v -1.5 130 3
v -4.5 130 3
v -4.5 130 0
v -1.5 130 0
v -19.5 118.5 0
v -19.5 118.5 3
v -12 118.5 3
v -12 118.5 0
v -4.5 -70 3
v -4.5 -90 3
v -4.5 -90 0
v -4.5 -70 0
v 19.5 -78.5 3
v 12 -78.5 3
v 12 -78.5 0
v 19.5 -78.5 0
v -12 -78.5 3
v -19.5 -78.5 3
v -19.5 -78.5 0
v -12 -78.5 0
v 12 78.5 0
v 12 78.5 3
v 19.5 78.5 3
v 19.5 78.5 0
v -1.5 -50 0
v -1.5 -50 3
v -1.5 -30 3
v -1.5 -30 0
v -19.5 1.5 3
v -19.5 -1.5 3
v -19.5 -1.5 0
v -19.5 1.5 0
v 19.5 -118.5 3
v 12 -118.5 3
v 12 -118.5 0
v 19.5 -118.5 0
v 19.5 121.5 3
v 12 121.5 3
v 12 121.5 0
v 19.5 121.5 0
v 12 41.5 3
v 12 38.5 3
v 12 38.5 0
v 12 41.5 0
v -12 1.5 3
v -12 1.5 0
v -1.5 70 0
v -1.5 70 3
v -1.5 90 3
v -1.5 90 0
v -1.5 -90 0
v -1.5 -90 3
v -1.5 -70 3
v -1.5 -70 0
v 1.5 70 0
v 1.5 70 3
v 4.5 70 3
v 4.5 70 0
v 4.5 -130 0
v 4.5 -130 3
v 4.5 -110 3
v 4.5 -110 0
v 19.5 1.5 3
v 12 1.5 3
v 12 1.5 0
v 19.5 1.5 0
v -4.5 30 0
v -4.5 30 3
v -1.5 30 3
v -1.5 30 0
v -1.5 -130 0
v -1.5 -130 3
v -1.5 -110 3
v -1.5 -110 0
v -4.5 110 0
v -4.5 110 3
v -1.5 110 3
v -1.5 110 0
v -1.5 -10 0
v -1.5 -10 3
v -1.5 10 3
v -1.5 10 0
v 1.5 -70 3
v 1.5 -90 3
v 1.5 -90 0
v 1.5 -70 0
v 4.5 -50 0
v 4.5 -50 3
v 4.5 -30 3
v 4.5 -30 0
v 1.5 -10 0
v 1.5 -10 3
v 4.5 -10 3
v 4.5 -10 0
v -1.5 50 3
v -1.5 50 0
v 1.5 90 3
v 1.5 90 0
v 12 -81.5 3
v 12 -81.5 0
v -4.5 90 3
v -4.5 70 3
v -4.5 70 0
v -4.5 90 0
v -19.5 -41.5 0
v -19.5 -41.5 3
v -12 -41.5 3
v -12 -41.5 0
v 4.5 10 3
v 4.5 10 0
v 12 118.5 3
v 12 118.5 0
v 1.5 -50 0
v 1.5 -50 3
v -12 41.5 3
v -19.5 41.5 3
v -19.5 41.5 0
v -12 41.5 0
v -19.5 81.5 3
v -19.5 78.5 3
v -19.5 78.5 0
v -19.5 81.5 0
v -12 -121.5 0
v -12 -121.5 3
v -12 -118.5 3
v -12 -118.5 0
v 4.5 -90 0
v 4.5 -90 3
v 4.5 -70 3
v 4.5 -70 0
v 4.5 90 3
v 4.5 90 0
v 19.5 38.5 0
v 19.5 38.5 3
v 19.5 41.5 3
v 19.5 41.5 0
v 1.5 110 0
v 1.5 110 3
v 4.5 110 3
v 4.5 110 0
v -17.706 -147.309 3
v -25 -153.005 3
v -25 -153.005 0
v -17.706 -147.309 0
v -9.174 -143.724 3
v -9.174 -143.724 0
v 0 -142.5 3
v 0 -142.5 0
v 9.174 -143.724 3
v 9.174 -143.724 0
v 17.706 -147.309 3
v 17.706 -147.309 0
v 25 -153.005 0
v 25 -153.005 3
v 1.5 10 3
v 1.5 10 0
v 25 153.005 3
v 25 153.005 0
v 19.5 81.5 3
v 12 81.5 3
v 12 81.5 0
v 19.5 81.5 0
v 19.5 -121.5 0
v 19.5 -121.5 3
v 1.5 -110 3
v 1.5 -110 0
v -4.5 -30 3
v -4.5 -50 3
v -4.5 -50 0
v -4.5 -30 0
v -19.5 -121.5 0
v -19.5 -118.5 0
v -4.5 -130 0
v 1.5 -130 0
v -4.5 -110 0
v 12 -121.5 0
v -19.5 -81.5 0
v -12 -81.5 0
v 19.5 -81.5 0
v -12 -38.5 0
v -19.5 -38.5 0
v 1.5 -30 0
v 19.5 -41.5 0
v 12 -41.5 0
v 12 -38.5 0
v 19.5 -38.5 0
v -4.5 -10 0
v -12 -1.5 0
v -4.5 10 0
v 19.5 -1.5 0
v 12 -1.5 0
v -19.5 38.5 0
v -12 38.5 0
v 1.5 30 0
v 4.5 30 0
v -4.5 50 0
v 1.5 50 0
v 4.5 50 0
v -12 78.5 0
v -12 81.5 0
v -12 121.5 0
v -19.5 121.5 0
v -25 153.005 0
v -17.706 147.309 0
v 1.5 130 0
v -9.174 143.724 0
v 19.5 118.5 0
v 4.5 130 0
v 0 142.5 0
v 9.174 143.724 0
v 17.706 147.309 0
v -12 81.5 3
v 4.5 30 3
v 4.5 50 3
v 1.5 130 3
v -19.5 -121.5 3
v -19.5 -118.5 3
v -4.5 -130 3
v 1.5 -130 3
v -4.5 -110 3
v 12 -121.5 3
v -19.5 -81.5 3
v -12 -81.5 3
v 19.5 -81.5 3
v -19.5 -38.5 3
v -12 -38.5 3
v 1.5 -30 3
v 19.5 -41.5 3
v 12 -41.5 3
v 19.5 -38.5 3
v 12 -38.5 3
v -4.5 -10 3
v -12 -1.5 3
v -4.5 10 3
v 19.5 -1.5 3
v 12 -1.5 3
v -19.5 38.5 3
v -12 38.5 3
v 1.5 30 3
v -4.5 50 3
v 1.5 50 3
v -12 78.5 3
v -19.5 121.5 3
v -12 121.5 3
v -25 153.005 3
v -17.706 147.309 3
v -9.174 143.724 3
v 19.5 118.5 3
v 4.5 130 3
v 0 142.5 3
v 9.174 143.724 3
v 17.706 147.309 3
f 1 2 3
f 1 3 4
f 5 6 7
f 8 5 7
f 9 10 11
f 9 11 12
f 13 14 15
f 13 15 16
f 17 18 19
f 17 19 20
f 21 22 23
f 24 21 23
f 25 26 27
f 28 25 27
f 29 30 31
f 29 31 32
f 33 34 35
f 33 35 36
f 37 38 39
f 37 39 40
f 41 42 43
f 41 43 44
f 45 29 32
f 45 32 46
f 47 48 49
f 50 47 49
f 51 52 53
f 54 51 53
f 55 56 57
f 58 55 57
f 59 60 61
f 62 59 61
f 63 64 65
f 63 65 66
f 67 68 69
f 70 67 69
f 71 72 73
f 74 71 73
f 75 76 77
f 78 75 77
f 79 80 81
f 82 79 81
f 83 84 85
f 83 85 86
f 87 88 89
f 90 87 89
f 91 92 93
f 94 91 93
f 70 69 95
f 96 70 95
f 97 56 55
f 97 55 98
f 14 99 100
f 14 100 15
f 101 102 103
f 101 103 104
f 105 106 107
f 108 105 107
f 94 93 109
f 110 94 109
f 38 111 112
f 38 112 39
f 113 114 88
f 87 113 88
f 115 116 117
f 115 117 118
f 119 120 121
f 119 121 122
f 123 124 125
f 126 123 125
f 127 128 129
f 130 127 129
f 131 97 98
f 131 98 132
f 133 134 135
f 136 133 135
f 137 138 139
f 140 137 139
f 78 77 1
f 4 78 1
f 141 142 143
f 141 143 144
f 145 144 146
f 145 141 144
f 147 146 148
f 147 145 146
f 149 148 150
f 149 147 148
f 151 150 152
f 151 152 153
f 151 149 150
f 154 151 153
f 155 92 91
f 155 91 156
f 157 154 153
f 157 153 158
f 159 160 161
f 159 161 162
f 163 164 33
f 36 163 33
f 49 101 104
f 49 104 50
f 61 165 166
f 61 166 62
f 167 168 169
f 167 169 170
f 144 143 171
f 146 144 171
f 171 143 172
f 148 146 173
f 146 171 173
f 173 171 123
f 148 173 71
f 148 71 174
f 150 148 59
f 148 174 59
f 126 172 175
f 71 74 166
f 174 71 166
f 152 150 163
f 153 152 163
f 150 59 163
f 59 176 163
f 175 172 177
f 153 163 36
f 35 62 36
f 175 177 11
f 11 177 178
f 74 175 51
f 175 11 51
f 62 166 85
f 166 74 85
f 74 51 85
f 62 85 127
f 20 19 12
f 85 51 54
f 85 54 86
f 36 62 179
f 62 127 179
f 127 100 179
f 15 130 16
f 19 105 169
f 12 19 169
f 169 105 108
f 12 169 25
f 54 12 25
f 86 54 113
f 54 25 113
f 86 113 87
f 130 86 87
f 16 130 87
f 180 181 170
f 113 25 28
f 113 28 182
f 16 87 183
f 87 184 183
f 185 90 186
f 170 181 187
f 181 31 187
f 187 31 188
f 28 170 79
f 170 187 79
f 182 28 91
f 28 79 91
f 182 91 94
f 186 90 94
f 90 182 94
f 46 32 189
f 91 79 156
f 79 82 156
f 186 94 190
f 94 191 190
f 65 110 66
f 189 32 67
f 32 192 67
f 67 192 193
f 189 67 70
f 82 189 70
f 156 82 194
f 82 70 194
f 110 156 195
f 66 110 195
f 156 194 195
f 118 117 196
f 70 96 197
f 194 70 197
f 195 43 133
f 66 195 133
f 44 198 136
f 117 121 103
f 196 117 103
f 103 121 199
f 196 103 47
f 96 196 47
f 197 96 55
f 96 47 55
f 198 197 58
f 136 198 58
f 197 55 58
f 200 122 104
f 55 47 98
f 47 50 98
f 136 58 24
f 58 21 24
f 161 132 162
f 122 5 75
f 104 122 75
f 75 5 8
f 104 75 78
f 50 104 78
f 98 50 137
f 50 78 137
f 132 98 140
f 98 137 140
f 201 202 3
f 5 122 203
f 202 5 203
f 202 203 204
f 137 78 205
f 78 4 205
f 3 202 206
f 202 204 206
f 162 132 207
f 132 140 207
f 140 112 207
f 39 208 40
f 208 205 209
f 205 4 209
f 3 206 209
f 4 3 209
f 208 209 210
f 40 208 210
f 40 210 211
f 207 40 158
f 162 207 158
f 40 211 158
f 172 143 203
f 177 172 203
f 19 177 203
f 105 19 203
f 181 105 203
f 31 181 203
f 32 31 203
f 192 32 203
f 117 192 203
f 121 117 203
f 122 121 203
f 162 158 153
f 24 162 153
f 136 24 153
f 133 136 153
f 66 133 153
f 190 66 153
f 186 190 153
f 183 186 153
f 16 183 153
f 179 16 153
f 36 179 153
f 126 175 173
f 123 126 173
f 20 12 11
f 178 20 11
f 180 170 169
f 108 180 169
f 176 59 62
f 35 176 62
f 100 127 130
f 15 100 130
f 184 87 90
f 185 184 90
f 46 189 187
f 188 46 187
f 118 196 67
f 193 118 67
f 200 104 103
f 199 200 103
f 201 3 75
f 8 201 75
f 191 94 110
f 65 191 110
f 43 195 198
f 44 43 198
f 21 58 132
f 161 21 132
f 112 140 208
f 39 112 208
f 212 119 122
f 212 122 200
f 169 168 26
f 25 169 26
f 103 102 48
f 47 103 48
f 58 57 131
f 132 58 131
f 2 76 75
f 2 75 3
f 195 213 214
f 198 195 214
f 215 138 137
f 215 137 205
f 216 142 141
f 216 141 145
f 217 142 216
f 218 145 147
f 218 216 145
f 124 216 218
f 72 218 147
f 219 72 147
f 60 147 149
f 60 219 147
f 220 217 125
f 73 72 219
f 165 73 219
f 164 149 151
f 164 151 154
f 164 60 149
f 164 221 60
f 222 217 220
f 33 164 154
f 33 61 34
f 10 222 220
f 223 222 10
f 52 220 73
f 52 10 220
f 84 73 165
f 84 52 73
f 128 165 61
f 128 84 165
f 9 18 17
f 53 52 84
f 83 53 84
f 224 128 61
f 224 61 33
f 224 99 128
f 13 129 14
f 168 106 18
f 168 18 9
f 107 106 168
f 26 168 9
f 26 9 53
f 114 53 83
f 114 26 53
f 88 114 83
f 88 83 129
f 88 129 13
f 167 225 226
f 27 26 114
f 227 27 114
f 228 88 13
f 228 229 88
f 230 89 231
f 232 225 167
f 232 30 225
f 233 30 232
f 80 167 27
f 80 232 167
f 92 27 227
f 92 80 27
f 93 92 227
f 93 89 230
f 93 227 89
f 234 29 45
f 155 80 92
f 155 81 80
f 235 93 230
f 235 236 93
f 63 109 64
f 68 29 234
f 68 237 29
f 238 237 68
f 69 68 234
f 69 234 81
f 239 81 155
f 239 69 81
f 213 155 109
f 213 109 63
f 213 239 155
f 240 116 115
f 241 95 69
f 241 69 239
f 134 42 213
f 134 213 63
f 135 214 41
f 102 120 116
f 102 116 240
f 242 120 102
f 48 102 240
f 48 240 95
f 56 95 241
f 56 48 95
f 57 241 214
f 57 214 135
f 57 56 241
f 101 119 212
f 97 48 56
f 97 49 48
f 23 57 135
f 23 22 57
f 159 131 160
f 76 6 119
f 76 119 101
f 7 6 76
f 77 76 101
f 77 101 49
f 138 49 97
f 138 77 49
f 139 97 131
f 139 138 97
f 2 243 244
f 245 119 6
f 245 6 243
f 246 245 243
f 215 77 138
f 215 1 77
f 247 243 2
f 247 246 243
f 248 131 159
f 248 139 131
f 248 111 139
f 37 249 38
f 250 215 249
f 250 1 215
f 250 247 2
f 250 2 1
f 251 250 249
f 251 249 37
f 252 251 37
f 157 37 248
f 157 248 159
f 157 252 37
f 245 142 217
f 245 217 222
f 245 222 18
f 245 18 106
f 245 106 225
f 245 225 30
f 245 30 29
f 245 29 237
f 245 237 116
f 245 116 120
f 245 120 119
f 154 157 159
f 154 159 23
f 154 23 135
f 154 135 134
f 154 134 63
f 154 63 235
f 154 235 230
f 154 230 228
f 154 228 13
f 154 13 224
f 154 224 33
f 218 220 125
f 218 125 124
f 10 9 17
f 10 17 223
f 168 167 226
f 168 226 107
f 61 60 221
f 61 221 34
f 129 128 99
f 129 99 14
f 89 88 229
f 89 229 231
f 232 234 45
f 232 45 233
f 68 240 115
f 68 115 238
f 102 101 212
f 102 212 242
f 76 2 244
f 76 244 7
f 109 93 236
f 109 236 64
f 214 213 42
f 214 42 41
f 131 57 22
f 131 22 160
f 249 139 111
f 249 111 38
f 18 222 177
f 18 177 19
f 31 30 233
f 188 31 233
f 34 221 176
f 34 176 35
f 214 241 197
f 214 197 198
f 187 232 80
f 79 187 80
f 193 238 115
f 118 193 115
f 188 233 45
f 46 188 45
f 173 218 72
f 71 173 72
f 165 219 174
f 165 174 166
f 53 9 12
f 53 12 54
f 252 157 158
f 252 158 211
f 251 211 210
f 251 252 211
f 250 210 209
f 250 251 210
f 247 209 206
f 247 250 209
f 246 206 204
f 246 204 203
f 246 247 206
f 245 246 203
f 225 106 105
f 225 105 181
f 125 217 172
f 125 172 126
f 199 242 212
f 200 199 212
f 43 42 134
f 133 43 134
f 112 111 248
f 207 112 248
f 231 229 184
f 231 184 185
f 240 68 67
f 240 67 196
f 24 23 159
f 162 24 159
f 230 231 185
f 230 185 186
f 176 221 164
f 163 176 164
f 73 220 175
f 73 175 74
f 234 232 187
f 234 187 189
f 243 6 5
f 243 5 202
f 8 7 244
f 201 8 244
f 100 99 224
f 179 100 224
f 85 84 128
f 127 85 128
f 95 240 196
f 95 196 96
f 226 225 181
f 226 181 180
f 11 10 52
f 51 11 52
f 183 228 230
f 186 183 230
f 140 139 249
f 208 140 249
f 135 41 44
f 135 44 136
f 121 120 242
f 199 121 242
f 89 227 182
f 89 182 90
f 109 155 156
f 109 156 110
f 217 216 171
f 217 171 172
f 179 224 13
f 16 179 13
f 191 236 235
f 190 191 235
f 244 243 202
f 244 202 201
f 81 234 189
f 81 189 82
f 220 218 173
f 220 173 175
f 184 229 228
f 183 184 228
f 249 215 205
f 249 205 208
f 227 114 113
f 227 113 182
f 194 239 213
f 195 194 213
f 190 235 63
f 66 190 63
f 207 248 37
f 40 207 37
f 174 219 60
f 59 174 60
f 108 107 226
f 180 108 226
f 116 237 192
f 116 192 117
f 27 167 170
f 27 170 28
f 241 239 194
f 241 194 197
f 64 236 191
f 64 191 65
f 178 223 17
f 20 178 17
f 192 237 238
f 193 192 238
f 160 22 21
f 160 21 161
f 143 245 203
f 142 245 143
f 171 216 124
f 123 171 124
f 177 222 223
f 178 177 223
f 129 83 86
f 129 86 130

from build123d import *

# Parameters (mm, degrees)
F0_W     = 50
F0_H     = 280
F1_DEPTH = 3
F2_W     = 3
F2_H     = 20
F3_DEPTH = 25
F4_W     = 7.5
F4_H     = 3
F5_DEPTH = 25
F7_DEPTH = 3


with BuildPart() as f1:
    # F0 (on Top) → F1 (new body)
    with BuildSketch(Plane.XY):
        Rectangle(F0_W, F0_H)
    extrude(amount=F1_DEPTH)

    # F2 (on face) → F3 (cut)
    with BuildSketch(Plane.XY.offset(3)):
        with Locations((3, 120)):
            Rectangle(F2_W, F2_H)
        with Locations((3, 80)):
            Rectangle(F2_W, F2_H)
        with Locations((3, 40)):
            Rectangle(F2_W, F2_H)
        with Locations((3, 0)):
            Rectangle(F2_W, F2_H)
        with Locations((3, -40)):
            Rectangle(F2_W, F2_H)
        with Locations((3, -80)):
            Rectangle(F2_W, F2_H)
        with Locations((3, -120)):
            Rectangle(F2_W, F2_H)
        with Locations((-3, 120)):
            Rectangle(F2_W, F2_H)
        with Locations((-3, 80)):
            Rectangle(F2_W, F2_H)
        with Locations((-3, 40)):
            Rectangle(F2_W, F2_H)
        with Locations((-3, 0)):
            Rectangle(F2_W, F2_H)
        with Locations((-3, -40)):
            Rectangle(F2_W, F2_H)
        with Locations((-3, -80)):
            Rectangle(F2_W, F2_H)
        with Locations((-3, -120)):
            Rectangle(F2_W, F2_H)
    extrude(amount=-F3_DEPTH, mode=Mode.SUBTRACT)

    # F4 (on face) → F5 (cut)
    with BuildSketch(Plane.XY.offset(3)):
        with Locations((15.75, 120)):
            Rectangle(F4_W, F4_H)
        with Locations((15.75, 80)):
            Rectangle(F4_W, F4_H)
        with Locations((15.75, 40)):
            Rectangle(F4_W, F4_H)
        with Locations((15.75, 0)):
            Rectangle(F4_W, F4_H)
        with Locations((15.75, -40)):
            Rectangle(F4_W, F4_H)
        with Locations((15.75, -80)):
            Rectangle(F4_W, F4_H)
        with Locations((15.75, -120)):
            Rectangle(F4_W, F4_H)
        with Locations((-15.75, 120)):
            Rectangle(F4_W, F4_H)
        with Locations((-15.75, -80)):
            Rectangle(F4_W, F4_H)
        with Locations((-15.75, 40)):
            Rectangle(F4_W, F4_H)
        with Locations((-15.75, 80)):
            Rectangle(F4_W, F4_H)
        with Locations((-15.75, -40)):
            Rectangle(F4_W, F4_H)
        with Locations((-15.75, -120)):
            Rectangle(F4_W, F4_H)
        with Locations((-15.75, 0)):
            Rectangle(F4_W, F4_H)
    extrude(amount=-F5_DEPTH, mode=Mode.SUBTRACT)

    # F6 (on face) → F7 (join)
    with BuildSketch(Plane.XY.offset(3)):
        with BuildLine():
            ThreePointArc((25, 153.005103), (0, 142.5), (-25, 153.005103))
            Line((-25, 153.005103), (-25, 140))
            Line((-25, 140), (25, 140))
            Line((25, 140), (25, 153.005103))
        make_face()
        with BuildLine():
            Line((25, -140), (-25, -140))
            Line((-25, -140), (-25, -153.005103))
            ThreePointArc((-25, -153.005103), (0, -142.5), (25, -153.005103))
            Line((25, -153.005103), (25, -140))
        make_face()
    extrude(amount=-F7_DEPTH)


solid = f1.part
